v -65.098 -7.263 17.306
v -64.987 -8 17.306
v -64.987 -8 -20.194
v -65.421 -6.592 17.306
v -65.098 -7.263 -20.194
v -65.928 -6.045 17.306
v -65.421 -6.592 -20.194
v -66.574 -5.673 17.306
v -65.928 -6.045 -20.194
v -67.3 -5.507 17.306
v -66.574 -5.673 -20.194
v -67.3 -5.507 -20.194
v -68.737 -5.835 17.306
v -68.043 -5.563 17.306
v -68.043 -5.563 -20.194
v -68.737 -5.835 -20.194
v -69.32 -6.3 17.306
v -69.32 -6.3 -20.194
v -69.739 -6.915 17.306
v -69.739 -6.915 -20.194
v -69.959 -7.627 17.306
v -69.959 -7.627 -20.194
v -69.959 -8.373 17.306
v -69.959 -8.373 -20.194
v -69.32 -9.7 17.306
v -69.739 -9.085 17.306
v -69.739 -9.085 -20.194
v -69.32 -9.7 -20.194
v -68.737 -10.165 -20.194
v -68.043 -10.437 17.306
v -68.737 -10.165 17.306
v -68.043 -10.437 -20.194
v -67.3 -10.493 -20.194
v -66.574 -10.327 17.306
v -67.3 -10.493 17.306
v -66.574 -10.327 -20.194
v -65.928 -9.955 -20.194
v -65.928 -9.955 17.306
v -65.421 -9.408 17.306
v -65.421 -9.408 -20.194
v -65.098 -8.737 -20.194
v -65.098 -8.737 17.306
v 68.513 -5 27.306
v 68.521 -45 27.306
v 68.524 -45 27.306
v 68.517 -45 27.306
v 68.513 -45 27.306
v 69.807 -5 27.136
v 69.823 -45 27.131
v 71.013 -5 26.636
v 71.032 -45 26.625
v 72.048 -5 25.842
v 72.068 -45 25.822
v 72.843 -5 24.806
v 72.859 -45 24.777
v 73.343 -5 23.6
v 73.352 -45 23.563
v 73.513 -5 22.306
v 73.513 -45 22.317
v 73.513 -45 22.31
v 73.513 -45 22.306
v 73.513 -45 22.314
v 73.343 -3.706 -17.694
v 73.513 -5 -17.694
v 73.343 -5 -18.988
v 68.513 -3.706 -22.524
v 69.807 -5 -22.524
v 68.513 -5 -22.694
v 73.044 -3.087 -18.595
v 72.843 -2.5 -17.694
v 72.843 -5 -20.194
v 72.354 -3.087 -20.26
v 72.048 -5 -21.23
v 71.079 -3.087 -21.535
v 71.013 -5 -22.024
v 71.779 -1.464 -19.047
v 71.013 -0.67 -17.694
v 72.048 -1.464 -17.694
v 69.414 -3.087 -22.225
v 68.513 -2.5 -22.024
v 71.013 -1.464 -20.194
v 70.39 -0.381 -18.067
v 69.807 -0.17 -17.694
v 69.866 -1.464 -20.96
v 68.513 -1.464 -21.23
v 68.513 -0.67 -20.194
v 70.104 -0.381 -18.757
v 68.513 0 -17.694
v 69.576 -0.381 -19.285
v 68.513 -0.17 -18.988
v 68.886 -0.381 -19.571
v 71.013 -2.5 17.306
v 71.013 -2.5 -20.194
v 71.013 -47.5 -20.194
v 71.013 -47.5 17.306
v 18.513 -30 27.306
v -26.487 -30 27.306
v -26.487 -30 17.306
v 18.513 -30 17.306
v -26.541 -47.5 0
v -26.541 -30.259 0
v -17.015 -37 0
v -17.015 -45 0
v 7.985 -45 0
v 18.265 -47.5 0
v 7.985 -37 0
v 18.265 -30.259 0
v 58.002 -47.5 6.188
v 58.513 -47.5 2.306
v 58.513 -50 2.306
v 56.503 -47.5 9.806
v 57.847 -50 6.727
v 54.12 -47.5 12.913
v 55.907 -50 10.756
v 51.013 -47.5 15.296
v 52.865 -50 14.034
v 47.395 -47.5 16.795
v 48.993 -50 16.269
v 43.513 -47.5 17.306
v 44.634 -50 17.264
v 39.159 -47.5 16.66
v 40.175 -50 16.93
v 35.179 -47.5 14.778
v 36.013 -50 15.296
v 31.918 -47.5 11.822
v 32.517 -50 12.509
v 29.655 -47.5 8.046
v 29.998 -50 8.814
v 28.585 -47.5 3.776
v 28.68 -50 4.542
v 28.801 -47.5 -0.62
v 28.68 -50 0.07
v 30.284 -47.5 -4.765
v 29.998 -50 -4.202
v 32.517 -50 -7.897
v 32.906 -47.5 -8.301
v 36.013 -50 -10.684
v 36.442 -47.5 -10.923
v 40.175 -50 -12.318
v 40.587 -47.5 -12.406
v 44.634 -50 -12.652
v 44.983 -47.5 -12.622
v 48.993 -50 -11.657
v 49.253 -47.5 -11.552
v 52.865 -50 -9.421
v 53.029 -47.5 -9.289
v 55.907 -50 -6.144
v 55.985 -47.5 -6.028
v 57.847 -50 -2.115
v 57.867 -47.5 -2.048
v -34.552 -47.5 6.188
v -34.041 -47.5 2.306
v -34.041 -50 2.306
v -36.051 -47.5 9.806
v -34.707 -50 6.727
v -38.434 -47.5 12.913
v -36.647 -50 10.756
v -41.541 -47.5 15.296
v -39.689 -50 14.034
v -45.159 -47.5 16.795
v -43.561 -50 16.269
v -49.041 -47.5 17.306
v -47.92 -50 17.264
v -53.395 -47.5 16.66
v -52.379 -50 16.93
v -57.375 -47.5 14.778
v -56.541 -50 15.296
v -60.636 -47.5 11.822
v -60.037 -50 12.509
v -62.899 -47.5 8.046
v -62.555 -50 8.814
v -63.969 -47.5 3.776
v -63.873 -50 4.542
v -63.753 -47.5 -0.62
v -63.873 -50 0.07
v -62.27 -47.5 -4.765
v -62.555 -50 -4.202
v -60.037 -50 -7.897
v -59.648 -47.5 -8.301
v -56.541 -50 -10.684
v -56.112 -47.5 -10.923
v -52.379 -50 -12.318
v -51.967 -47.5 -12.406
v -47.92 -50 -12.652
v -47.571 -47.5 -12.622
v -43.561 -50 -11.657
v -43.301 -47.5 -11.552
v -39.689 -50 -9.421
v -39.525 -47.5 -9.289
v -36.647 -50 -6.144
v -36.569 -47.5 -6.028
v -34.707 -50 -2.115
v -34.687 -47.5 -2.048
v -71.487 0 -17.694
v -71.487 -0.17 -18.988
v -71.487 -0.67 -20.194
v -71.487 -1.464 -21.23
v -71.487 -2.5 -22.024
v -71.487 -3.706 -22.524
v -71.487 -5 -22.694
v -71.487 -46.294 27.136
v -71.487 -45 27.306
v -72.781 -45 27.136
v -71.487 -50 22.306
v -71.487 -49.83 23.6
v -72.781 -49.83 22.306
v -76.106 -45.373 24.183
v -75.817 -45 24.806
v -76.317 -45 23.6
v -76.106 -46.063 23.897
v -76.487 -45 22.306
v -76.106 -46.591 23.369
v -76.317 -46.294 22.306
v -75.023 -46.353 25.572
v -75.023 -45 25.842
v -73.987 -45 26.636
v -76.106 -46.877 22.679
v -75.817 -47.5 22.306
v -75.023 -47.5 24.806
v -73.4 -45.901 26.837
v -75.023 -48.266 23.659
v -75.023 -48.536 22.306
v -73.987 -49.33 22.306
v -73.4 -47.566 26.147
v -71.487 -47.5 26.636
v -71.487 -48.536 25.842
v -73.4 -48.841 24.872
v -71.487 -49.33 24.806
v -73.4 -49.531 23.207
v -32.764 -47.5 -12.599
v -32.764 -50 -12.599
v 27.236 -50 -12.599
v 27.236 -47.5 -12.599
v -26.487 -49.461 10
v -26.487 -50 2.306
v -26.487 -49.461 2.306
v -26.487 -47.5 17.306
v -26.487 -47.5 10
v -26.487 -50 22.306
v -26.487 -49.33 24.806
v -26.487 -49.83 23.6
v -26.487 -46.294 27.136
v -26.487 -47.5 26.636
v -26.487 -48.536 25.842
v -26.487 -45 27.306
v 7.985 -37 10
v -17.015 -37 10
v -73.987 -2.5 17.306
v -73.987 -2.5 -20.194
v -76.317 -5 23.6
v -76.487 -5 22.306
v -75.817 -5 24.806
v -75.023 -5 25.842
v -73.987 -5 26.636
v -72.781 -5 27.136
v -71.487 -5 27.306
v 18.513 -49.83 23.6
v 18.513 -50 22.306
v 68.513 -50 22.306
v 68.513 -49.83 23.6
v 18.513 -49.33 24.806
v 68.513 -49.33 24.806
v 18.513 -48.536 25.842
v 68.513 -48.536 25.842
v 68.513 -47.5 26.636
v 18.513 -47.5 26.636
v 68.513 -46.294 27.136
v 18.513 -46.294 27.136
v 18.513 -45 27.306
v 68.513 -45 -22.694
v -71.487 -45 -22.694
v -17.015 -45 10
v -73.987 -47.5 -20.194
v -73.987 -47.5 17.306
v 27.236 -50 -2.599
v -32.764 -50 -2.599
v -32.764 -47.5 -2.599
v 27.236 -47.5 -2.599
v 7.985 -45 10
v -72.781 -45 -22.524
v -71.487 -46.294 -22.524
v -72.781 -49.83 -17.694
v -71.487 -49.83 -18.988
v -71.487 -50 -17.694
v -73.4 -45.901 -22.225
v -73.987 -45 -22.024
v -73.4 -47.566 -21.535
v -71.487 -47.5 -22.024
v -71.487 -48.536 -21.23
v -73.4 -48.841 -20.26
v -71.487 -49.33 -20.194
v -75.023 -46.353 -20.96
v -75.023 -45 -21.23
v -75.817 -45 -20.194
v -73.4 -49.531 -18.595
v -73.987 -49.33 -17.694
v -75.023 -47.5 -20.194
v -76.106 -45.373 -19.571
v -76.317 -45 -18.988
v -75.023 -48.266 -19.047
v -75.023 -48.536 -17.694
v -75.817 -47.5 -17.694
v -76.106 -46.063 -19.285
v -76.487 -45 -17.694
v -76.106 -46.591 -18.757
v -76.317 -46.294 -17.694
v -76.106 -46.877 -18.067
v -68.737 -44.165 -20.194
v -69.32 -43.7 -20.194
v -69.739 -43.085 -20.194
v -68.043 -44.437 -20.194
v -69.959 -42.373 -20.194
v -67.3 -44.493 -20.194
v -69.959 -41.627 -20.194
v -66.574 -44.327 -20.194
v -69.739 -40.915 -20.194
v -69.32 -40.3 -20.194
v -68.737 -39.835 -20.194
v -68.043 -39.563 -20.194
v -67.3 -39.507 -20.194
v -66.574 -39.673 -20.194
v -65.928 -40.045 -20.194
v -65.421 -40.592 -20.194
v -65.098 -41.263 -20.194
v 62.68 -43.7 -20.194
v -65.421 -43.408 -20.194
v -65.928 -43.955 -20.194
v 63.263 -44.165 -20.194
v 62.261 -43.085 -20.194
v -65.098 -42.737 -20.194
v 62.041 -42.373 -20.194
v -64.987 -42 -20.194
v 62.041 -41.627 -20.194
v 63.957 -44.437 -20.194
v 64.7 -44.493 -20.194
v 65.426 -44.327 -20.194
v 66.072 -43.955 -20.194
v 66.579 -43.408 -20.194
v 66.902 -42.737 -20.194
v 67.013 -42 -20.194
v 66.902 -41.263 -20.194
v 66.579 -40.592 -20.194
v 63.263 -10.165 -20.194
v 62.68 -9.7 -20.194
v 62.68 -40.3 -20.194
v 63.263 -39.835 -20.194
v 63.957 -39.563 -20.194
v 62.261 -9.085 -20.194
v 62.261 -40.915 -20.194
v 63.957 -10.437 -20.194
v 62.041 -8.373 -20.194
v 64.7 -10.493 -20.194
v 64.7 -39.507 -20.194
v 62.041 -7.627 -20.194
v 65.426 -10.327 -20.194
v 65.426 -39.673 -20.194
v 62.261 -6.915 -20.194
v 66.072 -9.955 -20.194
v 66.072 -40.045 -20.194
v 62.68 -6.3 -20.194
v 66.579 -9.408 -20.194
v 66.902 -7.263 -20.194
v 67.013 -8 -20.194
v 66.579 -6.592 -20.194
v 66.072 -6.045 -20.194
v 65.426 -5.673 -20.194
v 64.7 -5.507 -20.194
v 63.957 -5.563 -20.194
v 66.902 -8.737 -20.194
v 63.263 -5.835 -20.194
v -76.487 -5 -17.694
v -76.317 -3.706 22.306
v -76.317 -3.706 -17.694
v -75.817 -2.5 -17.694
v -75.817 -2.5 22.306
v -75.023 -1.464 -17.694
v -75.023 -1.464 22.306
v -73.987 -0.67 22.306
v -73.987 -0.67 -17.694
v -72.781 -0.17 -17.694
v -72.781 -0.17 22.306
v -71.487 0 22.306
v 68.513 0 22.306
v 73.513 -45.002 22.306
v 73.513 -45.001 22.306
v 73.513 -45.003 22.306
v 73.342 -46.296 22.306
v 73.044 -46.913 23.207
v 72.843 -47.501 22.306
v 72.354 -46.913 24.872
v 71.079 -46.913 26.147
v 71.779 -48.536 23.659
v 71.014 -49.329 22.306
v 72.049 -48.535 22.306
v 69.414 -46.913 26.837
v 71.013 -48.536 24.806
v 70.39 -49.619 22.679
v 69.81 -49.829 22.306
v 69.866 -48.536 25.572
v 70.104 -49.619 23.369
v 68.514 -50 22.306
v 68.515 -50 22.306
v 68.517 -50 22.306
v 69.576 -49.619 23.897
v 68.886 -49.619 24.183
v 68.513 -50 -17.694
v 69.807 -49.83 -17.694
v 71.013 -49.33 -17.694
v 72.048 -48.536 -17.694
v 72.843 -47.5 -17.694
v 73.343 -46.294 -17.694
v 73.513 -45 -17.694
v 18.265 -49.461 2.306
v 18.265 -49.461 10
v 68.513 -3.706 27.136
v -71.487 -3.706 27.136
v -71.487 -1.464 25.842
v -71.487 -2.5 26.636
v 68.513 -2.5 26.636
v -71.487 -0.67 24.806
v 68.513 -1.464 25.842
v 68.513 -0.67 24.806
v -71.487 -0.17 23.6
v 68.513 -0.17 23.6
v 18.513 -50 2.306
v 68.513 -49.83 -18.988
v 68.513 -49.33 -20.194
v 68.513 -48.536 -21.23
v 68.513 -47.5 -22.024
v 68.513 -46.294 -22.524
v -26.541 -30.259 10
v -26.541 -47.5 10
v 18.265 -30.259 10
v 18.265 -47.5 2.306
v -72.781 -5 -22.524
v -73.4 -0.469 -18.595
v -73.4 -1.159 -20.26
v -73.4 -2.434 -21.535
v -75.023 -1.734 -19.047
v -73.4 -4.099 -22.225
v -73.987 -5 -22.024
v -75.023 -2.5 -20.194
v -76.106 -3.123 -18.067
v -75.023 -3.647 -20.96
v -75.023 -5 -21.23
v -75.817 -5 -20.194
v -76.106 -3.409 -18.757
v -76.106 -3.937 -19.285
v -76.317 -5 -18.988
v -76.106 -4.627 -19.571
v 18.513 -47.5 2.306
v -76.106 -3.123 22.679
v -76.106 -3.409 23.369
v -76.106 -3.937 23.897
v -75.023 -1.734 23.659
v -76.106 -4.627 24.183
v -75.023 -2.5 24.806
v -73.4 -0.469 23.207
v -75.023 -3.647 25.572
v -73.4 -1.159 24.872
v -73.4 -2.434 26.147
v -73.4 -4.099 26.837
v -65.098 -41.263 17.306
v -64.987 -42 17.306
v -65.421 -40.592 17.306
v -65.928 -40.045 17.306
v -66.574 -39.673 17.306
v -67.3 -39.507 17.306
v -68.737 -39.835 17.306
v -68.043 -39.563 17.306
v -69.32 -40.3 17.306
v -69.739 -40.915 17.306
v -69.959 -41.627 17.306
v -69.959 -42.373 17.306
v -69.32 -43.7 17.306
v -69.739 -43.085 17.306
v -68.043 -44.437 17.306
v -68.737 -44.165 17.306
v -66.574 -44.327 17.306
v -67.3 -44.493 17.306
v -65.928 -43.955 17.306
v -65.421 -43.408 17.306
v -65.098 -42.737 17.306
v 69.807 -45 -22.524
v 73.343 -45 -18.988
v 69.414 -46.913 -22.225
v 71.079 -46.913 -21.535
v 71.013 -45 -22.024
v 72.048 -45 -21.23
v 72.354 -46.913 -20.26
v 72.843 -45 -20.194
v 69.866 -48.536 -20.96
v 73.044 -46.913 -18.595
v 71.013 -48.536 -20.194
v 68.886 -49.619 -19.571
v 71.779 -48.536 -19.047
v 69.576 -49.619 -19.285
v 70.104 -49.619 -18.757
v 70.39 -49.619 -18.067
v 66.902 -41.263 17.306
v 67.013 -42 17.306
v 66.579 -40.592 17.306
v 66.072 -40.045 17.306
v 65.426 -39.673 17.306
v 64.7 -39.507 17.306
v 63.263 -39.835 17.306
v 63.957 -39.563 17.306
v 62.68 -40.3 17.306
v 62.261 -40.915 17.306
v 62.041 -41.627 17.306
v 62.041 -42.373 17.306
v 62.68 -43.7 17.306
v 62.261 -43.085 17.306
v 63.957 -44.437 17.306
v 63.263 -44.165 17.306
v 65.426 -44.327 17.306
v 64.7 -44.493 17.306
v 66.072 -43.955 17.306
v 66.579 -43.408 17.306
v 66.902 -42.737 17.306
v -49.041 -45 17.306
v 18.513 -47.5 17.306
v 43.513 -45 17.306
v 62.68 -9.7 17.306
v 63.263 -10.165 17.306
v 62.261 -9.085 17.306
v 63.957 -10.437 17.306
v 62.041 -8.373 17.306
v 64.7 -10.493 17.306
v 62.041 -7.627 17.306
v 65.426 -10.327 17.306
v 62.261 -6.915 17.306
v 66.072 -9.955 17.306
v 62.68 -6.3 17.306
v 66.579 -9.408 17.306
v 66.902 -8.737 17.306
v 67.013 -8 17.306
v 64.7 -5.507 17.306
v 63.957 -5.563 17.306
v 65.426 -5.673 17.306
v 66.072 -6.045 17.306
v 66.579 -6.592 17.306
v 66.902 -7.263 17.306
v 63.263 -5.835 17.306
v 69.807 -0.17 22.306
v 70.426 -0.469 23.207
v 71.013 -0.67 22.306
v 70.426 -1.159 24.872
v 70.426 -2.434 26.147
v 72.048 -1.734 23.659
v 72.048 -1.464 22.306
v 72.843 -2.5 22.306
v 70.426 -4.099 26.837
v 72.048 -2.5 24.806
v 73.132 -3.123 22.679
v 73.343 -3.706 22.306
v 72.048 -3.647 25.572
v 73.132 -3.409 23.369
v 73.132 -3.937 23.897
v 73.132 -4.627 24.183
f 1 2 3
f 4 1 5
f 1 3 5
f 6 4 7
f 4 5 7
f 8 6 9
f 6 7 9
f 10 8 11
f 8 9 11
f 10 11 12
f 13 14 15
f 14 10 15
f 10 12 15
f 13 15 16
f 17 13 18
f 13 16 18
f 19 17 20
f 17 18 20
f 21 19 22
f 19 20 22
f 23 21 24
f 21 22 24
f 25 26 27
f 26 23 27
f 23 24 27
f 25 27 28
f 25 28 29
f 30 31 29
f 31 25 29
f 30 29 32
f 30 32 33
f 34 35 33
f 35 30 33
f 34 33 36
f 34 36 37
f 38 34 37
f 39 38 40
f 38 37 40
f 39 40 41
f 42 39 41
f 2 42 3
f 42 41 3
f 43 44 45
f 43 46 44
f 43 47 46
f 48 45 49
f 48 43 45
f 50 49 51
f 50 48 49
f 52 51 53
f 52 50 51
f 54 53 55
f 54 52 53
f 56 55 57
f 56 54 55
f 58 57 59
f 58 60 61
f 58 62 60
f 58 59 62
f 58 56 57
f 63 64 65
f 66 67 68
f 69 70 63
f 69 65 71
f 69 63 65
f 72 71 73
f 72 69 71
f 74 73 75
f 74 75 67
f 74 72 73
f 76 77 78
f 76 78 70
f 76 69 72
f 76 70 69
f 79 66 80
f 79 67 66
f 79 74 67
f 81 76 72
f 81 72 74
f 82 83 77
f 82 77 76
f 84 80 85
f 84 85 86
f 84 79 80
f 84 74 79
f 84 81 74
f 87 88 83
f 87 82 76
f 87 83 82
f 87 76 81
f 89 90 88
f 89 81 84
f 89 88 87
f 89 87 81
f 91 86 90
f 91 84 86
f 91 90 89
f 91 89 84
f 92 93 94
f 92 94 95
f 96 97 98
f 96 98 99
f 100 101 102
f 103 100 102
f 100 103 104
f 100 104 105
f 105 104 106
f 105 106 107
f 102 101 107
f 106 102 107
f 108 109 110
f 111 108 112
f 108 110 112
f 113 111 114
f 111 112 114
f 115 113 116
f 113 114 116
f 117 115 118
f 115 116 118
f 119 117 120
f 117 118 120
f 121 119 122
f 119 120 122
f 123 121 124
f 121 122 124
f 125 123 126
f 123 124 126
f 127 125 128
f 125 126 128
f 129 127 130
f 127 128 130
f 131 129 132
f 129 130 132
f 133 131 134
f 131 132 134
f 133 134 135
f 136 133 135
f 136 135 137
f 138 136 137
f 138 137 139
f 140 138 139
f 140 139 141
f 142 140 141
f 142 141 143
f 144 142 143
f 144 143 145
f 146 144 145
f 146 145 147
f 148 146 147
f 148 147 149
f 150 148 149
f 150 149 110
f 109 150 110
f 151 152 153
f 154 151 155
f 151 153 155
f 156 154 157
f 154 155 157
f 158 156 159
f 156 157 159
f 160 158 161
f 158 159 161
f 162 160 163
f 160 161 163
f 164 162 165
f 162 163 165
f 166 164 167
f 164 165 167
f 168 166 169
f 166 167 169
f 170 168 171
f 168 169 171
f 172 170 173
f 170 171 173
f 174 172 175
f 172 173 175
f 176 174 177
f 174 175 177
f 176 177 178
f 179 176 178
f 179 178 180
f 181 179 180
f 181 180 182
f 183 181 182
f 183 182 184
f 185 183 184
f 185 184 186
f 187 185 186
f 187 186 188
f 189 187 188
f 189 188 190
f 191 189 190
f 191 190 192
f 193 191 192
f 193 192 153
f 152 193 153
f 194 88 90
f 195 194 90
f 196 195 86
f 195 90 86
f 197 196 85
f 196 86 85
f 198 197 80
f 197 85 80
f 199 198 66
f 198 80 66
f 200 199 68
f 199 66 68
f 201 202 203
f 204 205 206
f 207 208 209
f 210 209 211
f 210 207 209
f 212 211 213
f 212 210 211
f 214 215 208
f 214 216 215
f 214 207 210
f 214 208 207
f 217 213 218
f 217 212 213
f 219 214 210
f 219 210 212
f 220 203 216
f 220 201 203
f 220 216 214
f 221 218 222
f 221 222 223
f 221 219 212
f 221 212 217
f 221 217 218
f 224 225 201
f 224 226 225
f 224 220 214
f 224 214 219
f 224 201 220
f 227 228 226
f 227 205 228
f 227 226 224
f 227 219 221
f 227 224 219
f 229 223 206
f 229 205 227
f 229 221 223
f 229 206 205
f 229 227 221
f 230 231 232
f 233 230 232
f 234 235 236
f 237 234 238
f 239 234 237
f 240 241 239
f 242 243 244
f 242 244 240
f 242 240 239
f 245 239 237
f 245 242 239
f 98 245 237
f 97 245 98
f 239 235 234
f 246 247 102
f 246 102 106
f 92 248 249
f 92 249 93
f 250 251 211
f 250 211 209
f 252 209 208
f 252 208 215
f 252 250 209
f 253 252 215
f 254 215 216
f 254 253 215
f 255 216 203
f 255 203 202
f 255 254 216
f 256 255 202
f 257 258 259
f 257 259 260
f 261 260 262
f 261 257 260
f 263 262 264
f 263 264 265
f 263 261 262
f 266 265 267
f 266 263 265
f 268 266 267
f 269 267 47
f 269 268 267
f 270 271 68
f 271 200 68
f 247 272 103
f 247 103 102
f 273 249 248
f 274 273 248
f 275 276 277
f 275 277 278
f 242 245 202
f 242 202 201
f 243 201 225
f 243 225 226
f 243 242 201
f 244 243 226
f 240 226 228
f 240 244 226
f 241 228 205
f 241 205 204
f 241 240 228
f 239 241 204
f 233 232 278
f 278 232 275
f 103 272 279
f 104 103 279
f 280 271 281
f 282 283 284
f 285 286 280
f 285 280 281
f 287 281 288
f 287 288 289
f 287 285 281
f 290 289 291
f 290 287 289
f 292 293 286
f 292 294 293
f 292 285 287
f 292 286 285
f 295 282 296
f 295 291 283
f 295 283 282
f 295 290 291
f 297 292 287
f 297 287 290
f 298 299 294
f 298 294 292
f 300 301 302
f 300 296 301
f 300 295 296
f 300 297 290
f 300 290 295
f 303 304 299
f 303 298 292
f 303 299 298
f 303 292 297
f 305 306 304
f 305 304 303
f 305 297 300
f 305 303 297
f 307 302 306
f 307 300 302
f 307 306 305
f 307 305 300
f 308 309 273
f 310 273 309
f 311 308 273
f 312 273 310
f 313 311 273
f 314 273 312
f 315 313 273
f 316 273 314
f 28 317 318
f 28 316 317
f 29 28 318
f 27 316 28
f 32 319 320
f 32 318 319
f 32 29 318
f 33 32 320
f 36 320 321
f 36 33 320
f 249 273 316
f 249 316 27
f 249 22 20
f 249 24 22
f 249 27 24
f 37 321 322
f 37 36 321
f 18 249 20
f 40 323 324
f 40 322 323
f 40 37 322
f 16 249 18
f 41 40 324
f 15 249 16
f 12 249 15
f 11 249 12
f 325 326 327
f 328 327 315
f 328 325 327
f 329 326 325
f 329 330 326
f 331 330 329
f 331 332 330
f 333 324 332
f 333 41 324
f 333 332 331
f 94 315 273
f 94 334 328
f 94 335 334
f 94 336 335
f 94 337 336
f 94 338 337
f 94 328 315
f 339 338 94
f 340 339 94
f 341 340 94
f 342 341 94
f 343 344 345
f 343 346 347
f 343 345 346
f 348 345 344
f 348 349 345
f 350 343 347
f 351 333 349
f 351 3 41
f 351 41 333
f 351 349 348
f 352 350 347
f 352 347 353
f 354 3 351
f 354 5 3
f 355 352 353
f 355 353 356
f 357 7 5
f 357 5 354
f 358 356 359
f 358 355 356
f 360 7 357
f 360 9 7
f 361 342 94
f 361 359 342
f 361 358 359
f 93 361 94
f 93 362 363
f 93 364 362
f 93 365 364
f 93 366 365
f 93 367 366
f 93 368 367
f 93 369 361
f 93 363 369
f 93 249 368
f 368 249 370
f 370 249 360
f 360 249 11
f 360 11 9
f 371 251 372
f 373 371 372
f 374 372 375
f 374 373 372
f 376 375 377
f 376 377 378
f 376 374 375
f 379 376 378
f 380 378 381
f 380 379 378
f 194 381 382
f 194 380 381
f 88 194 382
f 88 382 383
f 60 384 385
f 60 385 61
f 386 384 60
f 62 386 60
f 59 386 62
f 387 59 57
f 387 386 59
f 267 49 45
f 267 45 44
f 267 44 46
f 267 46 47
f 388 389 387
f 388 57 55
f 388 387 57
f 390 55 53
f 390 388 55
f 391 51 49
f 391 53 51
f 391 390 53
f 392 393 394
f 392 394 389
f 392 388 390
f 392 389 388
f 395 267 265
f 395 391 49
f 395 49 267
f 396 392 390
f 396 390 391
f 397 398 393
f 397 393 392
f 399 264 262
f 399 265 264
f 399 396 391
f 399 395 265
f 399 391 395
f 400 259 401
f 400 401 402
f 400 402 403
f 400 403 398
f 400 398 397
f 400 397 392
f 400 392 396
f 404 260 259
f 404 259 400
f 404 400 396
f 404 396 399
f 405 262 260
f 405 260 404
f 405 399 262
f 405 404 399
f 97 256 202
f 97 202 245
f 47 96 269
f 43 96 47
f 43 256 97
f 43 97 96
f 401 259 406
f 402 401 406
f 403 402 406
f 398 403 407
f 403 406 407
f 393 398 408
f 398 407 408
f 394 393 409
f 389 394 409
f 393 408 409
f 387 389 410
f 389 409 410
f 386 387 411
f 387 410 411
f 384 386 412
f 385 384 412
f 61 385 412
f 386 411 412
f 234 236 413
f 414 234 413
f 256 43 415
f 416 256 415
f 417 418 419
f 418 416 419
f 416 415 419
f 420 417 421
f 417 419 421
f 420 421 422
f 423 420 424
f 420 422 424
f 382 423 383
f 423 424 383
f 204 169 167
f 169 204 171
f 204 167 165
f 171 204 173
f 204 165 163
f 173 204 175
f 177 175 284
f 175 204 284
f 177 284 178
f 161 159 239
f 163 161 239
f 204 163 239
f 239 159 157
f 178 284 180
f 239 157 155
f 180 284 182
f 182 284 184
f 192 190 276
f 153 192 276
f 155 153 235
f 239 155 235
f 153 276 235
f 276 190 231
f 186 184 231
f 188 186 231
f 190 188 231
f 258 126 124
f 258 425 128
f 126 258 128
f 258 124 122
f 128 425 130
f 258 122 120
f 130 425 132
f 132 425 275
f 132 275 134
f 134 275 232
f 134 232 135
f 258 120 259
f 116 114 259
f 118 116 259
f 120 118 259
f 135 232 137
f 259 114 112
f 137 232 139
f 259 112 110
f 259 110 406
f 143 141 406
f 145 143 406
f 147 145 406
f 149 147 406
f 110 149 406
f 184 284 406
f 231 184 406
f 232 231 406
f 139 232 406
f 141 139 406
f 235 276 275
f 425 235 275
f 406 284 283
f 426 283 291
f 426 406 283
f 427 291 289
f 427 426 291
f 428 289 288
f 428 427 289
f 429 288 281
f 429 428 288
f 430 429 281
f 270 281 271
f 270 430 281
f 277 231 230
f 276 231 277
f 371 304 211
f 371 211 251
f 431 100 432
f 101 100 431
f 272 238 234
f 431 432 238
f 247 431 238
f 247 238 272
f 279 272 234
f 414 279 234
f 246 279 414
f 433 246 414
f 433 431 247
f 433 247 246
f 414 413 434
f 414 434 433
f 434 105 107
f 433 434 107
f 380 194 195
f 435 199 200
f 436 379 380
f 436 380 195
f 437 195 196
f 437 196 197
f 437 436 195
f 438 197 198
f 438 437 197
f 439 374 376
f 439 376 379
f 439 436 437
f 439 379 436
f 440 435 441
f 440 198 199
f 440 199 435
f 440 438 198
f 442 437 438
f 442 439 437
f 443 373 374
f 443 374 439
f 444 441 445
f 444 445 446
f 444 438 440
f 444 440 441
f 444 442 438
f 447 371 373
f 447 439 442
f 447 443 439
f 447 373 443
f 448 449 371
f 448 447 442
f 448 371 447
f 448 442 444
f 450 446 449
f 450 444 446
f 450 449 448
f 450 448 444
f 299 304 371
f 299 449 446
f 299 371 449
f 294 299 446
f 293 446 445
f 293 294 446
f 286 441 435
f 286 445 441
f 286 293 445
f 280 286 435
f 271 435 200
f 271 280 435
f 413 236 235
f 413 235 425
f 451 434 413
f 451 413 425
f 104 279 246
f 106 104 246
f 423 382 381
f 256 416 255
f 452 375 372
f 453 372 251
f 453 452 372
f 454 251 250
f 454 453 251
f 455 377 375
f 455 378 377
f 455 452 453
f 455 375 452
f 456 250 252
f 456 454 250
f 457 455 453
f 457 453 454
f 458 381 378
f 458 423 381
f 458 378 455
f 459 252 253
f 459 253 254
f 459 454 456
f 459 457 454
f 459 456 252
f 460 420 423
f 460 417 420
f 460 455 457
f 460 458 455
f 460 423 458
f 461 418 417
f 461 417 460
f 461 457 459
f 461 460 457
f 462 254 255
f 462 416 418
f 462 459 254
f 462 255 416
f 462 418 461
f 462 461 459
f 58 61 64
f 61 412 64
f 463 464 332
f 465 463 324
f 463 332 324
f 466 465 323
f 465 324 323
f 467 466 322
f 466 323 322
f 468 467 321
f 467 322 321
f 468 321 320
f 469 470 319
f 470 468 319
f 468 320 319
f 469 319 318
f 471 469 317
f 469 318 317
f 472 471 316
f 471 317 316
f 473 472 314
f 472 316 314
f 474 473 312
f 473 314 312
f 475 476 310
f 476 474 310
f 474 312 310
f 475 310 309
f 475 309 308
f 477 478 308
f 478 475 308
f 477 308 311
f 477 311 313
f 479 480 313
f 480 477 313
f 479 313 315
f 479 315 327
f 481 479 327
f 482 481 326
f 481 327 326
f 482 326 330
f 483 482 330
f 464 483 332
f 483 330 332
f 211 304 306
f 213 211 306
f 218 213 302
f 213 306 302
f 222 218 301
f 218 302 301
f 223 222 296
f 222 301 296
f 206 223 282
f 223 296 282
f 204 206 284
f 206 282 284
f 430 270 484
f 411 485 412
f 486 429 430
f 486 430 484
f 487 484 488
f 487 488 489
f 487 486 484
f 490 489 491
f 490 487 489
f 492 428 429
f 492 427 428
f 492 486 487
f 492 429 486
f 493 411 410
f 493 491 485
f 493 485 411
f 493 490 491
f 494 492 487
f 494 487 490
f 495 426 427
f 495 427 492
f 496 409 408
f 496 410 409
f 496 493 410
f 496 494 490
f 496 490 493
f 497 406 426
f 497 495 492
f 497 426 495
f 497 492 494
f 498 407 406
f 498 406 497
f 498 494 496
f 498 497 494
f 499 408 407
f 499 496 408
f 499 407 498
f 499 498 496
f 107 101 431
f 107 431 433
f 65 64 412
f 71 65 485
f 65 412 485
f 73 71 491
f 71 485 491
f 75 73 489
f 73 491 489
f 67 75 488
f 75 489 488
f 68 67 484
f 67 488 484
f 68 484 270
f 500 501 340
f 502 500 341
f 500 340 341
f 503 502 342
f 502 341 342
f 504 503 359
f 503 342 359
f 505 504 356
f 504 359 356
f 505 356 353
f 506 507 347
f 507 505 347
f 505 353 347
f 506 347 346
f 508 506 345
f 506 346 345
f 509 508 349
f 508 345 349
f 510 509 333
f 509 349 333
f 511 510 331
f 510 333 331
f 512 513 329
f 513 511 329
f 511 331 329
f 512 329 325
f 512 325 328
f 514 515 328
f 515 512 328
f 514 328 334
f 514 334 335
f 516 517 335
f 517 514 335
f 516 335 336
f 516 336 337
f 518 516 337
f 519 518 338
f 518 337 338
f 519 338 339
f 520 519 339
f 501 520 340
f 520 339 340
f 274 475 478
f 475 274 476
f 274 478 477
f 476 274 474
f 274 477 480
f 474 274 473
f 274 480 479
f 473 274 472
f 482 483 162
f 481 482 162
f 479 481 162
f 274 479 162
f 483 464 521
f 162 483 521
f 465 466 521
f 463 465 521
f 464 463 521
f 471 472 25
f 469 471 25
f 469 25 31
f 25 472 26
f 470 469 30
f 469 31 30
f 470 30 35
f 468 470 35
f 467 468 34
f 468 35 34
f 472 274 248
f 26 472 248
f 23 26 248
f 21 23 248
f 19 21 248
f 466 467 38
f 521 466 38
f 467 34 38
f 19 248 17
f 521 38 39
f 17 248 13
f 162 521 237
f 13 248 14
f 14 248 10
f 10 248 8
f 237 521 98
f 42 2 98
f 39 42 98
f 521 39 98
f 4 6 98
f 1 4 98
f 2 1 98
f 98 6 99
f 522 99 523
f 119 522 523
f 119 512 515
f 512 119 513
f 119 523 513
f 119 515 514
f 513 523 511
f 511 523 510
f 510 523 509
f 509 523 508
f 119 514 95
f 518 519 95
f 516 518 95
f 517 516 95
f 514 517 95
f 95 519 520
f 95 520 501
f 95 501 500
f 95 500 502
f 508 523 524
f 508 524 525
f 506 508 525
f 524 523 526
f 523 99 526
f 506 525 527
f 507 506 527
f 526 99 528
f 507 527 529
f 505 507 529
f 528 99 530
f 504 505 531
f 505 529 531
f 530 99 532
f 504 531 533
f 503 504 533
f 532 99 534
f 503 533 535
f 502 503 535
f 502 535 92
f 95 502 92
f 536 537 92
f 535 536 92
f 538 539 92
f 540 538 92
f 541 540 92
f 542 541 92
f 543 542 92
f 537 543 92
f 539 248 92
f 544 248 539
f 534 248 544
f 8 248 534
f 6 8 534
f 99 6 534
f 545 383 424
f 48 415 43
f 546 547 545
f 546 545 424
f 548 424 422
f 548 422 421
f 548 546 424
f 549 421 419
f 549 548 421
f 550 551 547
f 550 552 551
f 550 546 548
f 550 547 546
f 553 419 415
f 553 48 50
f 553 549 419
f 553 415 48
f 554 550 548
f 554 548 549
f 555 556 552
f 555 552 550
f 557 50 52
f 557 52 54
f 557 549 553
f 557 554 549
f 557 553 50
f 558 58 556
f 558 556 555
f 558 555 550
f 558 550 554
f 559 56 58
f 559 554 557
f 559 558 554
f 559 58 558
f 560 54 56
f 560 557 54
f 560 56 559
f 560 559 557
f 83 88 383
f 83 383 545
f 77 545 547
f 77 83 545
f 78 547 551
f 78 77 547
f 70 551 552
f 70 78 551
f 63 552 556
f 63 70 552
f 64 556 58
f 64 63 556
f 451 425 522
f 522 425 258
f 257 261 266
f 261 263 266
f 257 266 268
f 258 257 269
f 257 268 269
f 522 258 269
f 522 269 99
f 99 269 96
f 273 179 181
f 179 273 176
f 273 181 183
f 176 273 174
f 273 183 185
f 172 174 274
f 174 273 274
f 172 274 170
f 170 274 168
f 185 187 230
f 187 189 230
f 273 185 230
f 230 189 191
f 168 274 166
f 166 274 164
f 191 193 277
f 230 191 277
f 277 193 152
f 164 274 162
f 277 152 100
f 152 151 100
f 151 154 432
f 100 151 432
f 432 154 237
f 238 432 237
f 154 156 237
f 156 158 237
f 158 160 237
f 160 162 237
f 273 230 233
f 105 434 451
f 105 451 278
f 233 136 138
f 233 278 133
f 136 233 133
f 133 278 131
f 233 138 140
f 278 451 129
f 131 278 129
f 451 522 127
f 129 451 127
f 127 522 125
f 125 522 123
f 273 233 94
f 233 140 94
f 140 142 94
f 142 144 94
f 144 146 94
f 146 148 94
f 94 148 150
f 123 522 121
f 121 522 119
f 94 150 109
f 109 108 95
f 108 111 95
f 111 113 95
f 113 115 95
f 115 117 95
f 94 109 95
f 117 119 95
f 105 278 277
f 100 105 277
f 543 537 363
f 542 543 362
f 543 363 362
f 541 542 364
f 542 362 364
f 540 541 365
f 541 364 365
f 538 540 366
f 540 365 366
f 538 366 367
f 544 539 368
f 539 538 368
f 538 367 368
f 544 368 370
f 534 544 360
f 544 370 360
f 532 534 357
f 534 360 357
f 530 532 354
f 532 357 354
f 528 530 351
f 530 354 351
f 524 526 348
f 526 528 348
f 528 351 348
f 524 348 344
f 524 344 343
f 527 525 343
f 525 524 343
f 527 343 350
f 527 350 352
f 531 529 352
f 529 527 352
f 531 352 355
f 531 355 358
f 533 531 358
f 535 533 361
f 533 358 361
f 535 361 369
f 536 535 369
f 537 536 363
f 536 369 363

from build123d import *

# Parameters (mm, degrees)
F0_W          = 150
F0_H          = 40
F1_DEPTH      = 50
F2_T          = -2.5
F5_R          = 2.5
F7_DEPTH      = 40
F6_R          = 2.5
F8_DEPTH      = 40
F4_R          = 2.5
F9_DEPTH      = 40
F3_R          = 2.5
F10_DEPTH     = 40
F11_W         = 150
F11_H         = 50
F12_DEPTH     = 10
F13_W         = 45
F13_H         = 20
F14_DEPTH     = 25
F15_W         = 44.8060352355
F15_H         = 19.2025862634
F16_DEPTH     = 10
F17_W         = 25
F17_H         = 8
F18_DEPTH     = 25
F19_R         = 15
F20_DEPTH     = 5
F21_R         = 5
F22_T1_DEPTH  = 57.5
F22_T3_DEPTH  = 40
F22_T5_DEPTH  = 57.5
F22_T7_DEPTH  = 40
F22_S11_W     = 5
F22_S11_H     = 5
F22_T12_DEPTH = 5
F22_S17_W     = 5
F22_S17_H     = 5
F22_T18_DEPTH = 5
F22_S23_W     = 5
F22_S23_H     = 5
F22_T24_DEPTH = 5
F22_S29_W     = 5
F22_S29_H     = 5
F22_T30_DEPTH = 5
F22_T34_ANGLE = 90
F22_T36_ANGLE = 90
F22_T38_ANGLE = 90
F23_T1_DEPTH  = 62.5
F23_S5_W      = 5
F23_S5_H      = 5
F23_T6_DEPTH  = 5
F24_W         = 60
F24_H         = 10
F25_DEPTH     = 25


# Not quite as in the source:
# - a fillet or chamfer that OpenCascade refuses, or shapes differently, is made with other operations: its cross-section is extruded or revolved along the edge and cut away or added


with BuildPart() as f1:
    # F0 (on Front) → F1 (new body)
    with BuildSketch(Plane.XZ):
        with Locations((-1.4870658517, -2.6939674467)):
            Rectangle(F0_W, F0_H)
    extrude(amount=F1_DEPTH)

    # F2
    f2_openings = [f1.faces().sort_by_distance(p)[0] for p in [
        (-1.487066, -25, 17.306033),
    ]]
    offset(amount=F2_T, openings=f2_openings)

    # F5 (on face) → F7 (join)
    with BuildSketch(Plane.XY.offset(-20.1939674467)):
        with Locations((64.5129341483, -42)):
            Circle(F5_R)
    extrude(amount=F7_DEPTH)

    # F6 (on face) → F8 (join)
    with BuildSketch(Plane.XY.offset(-20.1939674467)):
        with Locations((-67.4870658517, -42)):
            Circle(F6_R)
    extrude(amount=F8_DEPTH)

    # F4 (on face) → F9 (join)
    with BuildSketch(Plane.XY.offset(-20.1939674467)):
        with Locations((64.5129341483, -8)):
            Circle(F4_R)
    extrude(amount=F9_DEPTH)

    # F3 (on face) → F10 (join)
    with BuildSketch(Plane.XY.offset(-20.1939674467)):
        with Locations((-67.4870658517, -8)):
            Circle(F3_R)
    extrude(amount=F10_DEPTH)

    # F11 (on face) → F12 (join)
    with BuildSketch(Plane.XY.offset(17.3060325533)):
        with Locations((-1.4870658517, -25)):
            Rectangle(F11_W, F11_H)
    extrude(amount=F12_DEPTH)

    # F13 (on face) → F14 (cut)
    with BuildSketch(Plane.XY.offset(27.3060325533)):
        with Locations((-3.9870658517, -40)):
            Rectangle(F13_W, F13_H)
    extrude(amount=-F14_DEPTH, mode=Mode.SUBTRACT)

    # F15 (on Top) → F16 (join)
    with BuildSketch(Plane.XY):
        with Locations((-4.1379285976, -39.8599151522)):
            Rectangle(F15_W, F15_H)
    extrude(amount=F16_DEPTH)

    # F17 (on face) → F18 (cut)
    with BuildSketch(Plane.XY.offset(10)):
        with Locations((-4.5150823891, -41.0000055134)):
            Rectangle(F17_W, F17_H)
    extrude(amount=-F18_DEPTH, mode=Mode.SUBTRACT)

    # F19 (on face) → F20 (cut)
    with BuildSketch(Plane.XZ.offset(50)):
        with Locations((-49.0409471095, 2.3060325533)):
            Circle(F19_R)
        with Locations((43.5129341483, 2.3060325533)):
            Circle(F19_R)
    extrude(amount=-F20_DEPTH, mode=Mode.SUBTRACT)

    # F21
    f21_edges = [f1.edges().sort_by_distance(p)[0] for p in [
        (-1.487066, -50, -22.693967),
        (73.512934, -25, -22.693967),
        (-76.487066, -25, -22.693967),
        (-1.487066, 0, -22.693967),
        (-1.487066, 0, 27.306033),
        (-51.487066, -50, 27.306033),
    ]]
    fillet(f21_edges, radius=F21_R)

    # F22: fillet of radius 5 on 3 edges, made by hand

    # F22_s2 → F22_t1 (cut)
    with BuildSketch(Plane.XZ.offset(5)):
        with BuildLine():
            ThreePointArc((68.5129341483, 27.3060325533), (72.0484680542, 25.8415664592), (73.5129341483, 22.3060325533))
            Line((73.5129341483, 22.3060325533), (73.5129341483, 27.3060325533))
            Line((73.5129341483, 27.3060325533), (68.5129341483, 27.3060325533))
        make_face()
    extrude(amount=F22_T1_DEPTH, mode=Mode.SUBTRACT)

    # F22_s4 → F22_t3 (cut)
    with BuildSketch(Plane.XZ.offset(5)):
        with BuildLine():
            ThreePointArc((-76.4870658517, 22.3060325533), (-75.0225997576, 25.8415664592), (-71.4870658517, 27.3060325533))
            Line((-71.4870658517, 27.3060325533), (-76.4870658517, 27.3060325533))
            Line((-76.4870658517, 27.3060325533), (-76.4870658517, 22.3060325533))
        make_face()
    extrude(amount=F22_T3_DEPTH, mode=Mode.SUBTRACT)

    # F22_s6 → F22_t5 (cut)
    with BuildSketch(Plane.XY.offset(-17.6939674467)):
        with BuildLine():
            ThreePointArc((68.5129341483, -50), (72.0484680542, -48.5355339059), (73.5129341483, -45))
            Line((73.5129341483, -45), (73.5129341483, -50))
            Line((73.5129341483, -50), (68.5129341483, -50))
        make_face()
    extrude(amount=F22_T5_DEPTH, mode=Mode.SUBTRACT)

    # F22_s8 → F22_t7 (cut)
    with BuildSketch(Plane.XY.offset(-17.6939674467)):
        with BuildLine():
            ThreePointArc((-76.4870658517, -45), (-75.0225997576, -48.5355339059), (-71.4870658517, -50))
            Line((-71.4870658517, -50), (-76.4870658517, -50))
            Line((-76.4870658517, -50), (-76.4870658517, -45))
        make_face()
        with BuildLine():
            ThreePointArc((-76.4870658517, -5), (-75.0225997576, -1.4644660941), (-71.4870658517, 0))
            Line((-71.4870658517, 0), (-76.4870658517, 0))
            Line((-76.4870658517, 0), (-76.4870658517, -5))
        make_face()
        with BuildLine():
            ThreePointArc((68.5129341483, 0), (72.0484680542, -1.4644660941), (73.5129341483, -5))
            Line((73.5129341483, -5), (73.5129341483, 0))
            Line((73.5129341483, 0), (68.5129341483, 0))
        make_face()
    extrude(amount=F22_T7_DEPTH, mode=Mode.SUBTRACT)


with BuildPart() as f22_tool10:
    # F22_s11 → F22_t12 (new body)
    with BuildSketch(Plane.XZ.offset(45)):
        with Locations((71.0129341483, -20.1939674467)):
            Rectangle(F22_S11_W, F22_S11_H)
    extrude(amount=F22_T12_DEPTH)

    # F22_s13 → F22_t14 (revolve, cut)
    with BuildSketch(Plane(origin=(68.5129341483, -45, -17.6939674467), x_dir=(-0.7071067812, 0, 0.7071067812), z_dir=(0.7071067812, 0, 0.7071067812))):
        with BuildLine():
            ThreePointArc((0, -5), (5, 0), (0, 5))
            Line((0, 5), (0, -5))
        make_face()
    revolve(axis=Axis((68.5129341483, -45, -17.6939674467), (0, -1, 0)), mode=Mode.SUBTRACT)


with BuildPart() as f1_1:
    add(f1.part)

    # F22_t9: cut F22_tool10
    add(f22_tool10.part, mode=Mode.SUBTRACT)


with BuildPart() as f22_tool16:
    # F22_s17 → F22_t18 (new body)
    with BuildSketch(Plane.YZ.offset(-71.4870658517)):
        with Locations((-47.5, -20.1939674467)):
            Rectangle(F22_S17_W, F22_S17_H)
    extrude(amount=-F22_T18_DEPTH)

    # F22_s19 → F22_t20 (revolve, cut)
    with BuildSketch(Plane(origin=(-71.4870658517, -45, -17.6939674467), x_dir=(0, 0.7071067812, 0.7071067812), z_dir=(0, -0.7071067812, 0.7071067812))):
        with BuildLine():
            ThreePointArc((0, -5), (5, 0), (0, 5))
            Line((0, 5), (0, -5))
        make_face()
    revolve(axis=Axis((-71.4870658517, -45, -17.6939674467), (-1, 0, 0)), mode=Mode.SUBTRACT)


with BuildPart() as f1_2:
    add(f1_1.part)

    # F22_t15: cut F22_tool16
    add(f22_tool16.part, mode=Mode.SUBTRACT)


with BuildPart() as f22_tool22:
    # F22_s23 → F22_t24 (new body)
    with BuildSketch(Plane.YZ.offset(-71.4870658517)):
        with Locations((-2.5, -20.1939674467)):
            Rectangle(F22_S23_W, F22_S23_H)
    extrude(amount=-F22_T24_DEPTH)

    # F22_s25 → F22_t26 (revolve, cut)
    with BuildSketch(Plane(origin=(-71.4870658517, -5, -17.6939674467), x_dir=(0, -0.7071067812, 0.7071067812), z_dir=(0, -0.7071067812, -0.7071067812))):
        with BuildLine():
            ThreePointArc((0, -5), (5, 0), (0, 5))
            Line((0, 5), (0, -5))
        make_face()
    revolve(axis=Axis((-71.4870658517, -5, -17.6939674467), (-1, 0, 0)), mode=Mode.SUBTRACT)


with BuildPart() as f1_3:
    add(f1_2.part)

    # F22_t21: cut F22_tool22
    add(f22_tool22.part, mode=Mode.SUBTRACT)


with BuildPart() as f22_tool28:
    # F22_s29 → F22_t30 (new body)
    with BuildSketch(Plane.XZ.offset(5)):
        with Locations((71.0129341483, -20.1939674467)):
            Rectangle(F22_S29_W, F22_S29_H)
    extrude(amount=-F22_T30_DEPTH)

    # F22_s31 → F22_t32 (revolve, cut)
    with BuildSketch(Plane(origin=(68.5129341483, -5, -17.6939674467), x_dir=(-0.7071067812, 0, 0.7071067812), z_dir=(-0.7071067812, 0, -0.7071067812))):
        with BuildLine():
            ThreePointArc((0, -5), (5, 0), (0, 5))
            Line((0, 5), (0, -5))
        make_face()
    revolve(axis=Axis((68.5129341483, -5, -17.6939674467), (0, 1, 0)), mode=Mode.SUBTRACT)


with BuildPart() as f1_4:
    add(f1_3.part)

    # F22_t27: cut F22_tool28
    add(f22_tool28.part, mode=Mode.SUBTRACT)

    # F22_s33 → F22_t34 (revolve, cut)
    with BuildSketch(Plane.XY.offset(22.3060325533)):
        with BuildLine():
            ThreePointArc((-76.4870658517, -5), (-75.0225997576, -1.4644660941), (-71.4870658517, 0))
            Line((-71.4870658517, 0), (-76.4870658517, 0))
            Line((-76.4870658517, 0), (-76.4870658517, -5))
        make_face()
    revolve(axis=Axis((-76.4870658517, -5, 22.3060325533), (1, 0, 0)), revolution_arc=F22_T34_ANGLE, mode=Mode.SUBTRACT)

    # F22_s35 → F22_t36 (revolve, cut)
    with BuildSketch(Plane.XZ.offset(45)):
        with BuildLine():
            ThreePointArc((-76.4870658517, 22.3060325533), (-75.0225997576, 25.8415664592), (-71.4870658517, 27.3060325533))
            Line((-71.4870658517, 27.3060325533), (-76.4870658517, 27.3060325533))
            Line((-76.4870658517, 27.3060325533), (-76.4870658517, 22.3060325533))
        make_face()
    revolve(axis=Axis((-76.4870658517, -45, 22.3060325533), (1, 0, 0)), revolution_arc=F22_T36_ANGLE, mode=Mode.SUBTRACT)

    # F22_s37 → F22_t38 (revolve, cut)
    with BuildSketch(Plane.XY.offset(22.3060325533)):
        with BuildLine():
            ThreePointArc((68.5129341483, 0), (72.0484680542, -1.4644660941), (73.5129341483, -5))
            Line((73.5129341483, -5), (73.5129341483, 0))
            Line((73.5129341483, 0), (68.5129341483, 0))
        make_face()
    revolve(axis=Axis((73.5129341483, -5, 22.3060325533), (1, 0, 0)), revolution_arc=F22_T38_ANGLE, mode=Mode.SUBTRACT)

    # F23: fillet of radius 5 on 1 edges, made by hand

    # F23_s2 → F23_t1 (cut)
    with BuildSketch(Plane.YZ.offset(6.0129341483)):
        with BuildLine():
            ThreePointArc((-50, 22.3060325533), (-48.5355339059, 25.8415664592), (-45, 27.3060325533))
            Line((-45, 27.3060325533), (-50, 27.3060325533))
            Line((-50, 27.3060325533), (-50, 22.3060325533))
        make_face()
    extrude(amount=F23_T1_DEPTH, mode=Mode.SUBTRACT)


with BuildPart() as f23_tool4:
    # F23_s5 → F23_t6 (new body)
    with BuildSketch(Plane.XZ.offset(45)):
        with Locations((71.0129341483, 24.8060325533)):
            Rectangle(F23_S5_W, F23_S5_H)
    extrude(amount=F23_T6_DEPTH)

    # F23_s7 → F23_t8 (revolve, cut)
    with BuildSketch(Plane(origin=(68.5129341483, -45, 22.3060325533), x_dir=(-0.7071067812, 0, -0.7071067812), z_dir=(-0.7071067812, 0, 0.7071067812))):
        with BuildLine():
            ThreePointArc((0, -5), (5, 0), (0, 5))
            Line((0, 5), (0, -5))
        make_face()
    revolve(axis=Axis((68.5129341483, -45, 22.3060325533), (0, -1, 0)), mode=Mode.SUBTRACT)


with BuildPart() as f1_5:
    add(f1_4.part)

    # F23_t3: cut F23_tool4
    add(f23_tool4.part, mode=Mode.SUBTRACT)

    # F24 (on face) → F25 (cut)
    with BuildSketch(Plane.XZ.offset(50)):
        with Locations((-2.7640064806, -7.5991895379)):
            Rectangle(F24_W, F24_H)
    extrude(amount=-F25_DEPTH, mode=Mode.SUBTRACT)


solid = f1_5.part
